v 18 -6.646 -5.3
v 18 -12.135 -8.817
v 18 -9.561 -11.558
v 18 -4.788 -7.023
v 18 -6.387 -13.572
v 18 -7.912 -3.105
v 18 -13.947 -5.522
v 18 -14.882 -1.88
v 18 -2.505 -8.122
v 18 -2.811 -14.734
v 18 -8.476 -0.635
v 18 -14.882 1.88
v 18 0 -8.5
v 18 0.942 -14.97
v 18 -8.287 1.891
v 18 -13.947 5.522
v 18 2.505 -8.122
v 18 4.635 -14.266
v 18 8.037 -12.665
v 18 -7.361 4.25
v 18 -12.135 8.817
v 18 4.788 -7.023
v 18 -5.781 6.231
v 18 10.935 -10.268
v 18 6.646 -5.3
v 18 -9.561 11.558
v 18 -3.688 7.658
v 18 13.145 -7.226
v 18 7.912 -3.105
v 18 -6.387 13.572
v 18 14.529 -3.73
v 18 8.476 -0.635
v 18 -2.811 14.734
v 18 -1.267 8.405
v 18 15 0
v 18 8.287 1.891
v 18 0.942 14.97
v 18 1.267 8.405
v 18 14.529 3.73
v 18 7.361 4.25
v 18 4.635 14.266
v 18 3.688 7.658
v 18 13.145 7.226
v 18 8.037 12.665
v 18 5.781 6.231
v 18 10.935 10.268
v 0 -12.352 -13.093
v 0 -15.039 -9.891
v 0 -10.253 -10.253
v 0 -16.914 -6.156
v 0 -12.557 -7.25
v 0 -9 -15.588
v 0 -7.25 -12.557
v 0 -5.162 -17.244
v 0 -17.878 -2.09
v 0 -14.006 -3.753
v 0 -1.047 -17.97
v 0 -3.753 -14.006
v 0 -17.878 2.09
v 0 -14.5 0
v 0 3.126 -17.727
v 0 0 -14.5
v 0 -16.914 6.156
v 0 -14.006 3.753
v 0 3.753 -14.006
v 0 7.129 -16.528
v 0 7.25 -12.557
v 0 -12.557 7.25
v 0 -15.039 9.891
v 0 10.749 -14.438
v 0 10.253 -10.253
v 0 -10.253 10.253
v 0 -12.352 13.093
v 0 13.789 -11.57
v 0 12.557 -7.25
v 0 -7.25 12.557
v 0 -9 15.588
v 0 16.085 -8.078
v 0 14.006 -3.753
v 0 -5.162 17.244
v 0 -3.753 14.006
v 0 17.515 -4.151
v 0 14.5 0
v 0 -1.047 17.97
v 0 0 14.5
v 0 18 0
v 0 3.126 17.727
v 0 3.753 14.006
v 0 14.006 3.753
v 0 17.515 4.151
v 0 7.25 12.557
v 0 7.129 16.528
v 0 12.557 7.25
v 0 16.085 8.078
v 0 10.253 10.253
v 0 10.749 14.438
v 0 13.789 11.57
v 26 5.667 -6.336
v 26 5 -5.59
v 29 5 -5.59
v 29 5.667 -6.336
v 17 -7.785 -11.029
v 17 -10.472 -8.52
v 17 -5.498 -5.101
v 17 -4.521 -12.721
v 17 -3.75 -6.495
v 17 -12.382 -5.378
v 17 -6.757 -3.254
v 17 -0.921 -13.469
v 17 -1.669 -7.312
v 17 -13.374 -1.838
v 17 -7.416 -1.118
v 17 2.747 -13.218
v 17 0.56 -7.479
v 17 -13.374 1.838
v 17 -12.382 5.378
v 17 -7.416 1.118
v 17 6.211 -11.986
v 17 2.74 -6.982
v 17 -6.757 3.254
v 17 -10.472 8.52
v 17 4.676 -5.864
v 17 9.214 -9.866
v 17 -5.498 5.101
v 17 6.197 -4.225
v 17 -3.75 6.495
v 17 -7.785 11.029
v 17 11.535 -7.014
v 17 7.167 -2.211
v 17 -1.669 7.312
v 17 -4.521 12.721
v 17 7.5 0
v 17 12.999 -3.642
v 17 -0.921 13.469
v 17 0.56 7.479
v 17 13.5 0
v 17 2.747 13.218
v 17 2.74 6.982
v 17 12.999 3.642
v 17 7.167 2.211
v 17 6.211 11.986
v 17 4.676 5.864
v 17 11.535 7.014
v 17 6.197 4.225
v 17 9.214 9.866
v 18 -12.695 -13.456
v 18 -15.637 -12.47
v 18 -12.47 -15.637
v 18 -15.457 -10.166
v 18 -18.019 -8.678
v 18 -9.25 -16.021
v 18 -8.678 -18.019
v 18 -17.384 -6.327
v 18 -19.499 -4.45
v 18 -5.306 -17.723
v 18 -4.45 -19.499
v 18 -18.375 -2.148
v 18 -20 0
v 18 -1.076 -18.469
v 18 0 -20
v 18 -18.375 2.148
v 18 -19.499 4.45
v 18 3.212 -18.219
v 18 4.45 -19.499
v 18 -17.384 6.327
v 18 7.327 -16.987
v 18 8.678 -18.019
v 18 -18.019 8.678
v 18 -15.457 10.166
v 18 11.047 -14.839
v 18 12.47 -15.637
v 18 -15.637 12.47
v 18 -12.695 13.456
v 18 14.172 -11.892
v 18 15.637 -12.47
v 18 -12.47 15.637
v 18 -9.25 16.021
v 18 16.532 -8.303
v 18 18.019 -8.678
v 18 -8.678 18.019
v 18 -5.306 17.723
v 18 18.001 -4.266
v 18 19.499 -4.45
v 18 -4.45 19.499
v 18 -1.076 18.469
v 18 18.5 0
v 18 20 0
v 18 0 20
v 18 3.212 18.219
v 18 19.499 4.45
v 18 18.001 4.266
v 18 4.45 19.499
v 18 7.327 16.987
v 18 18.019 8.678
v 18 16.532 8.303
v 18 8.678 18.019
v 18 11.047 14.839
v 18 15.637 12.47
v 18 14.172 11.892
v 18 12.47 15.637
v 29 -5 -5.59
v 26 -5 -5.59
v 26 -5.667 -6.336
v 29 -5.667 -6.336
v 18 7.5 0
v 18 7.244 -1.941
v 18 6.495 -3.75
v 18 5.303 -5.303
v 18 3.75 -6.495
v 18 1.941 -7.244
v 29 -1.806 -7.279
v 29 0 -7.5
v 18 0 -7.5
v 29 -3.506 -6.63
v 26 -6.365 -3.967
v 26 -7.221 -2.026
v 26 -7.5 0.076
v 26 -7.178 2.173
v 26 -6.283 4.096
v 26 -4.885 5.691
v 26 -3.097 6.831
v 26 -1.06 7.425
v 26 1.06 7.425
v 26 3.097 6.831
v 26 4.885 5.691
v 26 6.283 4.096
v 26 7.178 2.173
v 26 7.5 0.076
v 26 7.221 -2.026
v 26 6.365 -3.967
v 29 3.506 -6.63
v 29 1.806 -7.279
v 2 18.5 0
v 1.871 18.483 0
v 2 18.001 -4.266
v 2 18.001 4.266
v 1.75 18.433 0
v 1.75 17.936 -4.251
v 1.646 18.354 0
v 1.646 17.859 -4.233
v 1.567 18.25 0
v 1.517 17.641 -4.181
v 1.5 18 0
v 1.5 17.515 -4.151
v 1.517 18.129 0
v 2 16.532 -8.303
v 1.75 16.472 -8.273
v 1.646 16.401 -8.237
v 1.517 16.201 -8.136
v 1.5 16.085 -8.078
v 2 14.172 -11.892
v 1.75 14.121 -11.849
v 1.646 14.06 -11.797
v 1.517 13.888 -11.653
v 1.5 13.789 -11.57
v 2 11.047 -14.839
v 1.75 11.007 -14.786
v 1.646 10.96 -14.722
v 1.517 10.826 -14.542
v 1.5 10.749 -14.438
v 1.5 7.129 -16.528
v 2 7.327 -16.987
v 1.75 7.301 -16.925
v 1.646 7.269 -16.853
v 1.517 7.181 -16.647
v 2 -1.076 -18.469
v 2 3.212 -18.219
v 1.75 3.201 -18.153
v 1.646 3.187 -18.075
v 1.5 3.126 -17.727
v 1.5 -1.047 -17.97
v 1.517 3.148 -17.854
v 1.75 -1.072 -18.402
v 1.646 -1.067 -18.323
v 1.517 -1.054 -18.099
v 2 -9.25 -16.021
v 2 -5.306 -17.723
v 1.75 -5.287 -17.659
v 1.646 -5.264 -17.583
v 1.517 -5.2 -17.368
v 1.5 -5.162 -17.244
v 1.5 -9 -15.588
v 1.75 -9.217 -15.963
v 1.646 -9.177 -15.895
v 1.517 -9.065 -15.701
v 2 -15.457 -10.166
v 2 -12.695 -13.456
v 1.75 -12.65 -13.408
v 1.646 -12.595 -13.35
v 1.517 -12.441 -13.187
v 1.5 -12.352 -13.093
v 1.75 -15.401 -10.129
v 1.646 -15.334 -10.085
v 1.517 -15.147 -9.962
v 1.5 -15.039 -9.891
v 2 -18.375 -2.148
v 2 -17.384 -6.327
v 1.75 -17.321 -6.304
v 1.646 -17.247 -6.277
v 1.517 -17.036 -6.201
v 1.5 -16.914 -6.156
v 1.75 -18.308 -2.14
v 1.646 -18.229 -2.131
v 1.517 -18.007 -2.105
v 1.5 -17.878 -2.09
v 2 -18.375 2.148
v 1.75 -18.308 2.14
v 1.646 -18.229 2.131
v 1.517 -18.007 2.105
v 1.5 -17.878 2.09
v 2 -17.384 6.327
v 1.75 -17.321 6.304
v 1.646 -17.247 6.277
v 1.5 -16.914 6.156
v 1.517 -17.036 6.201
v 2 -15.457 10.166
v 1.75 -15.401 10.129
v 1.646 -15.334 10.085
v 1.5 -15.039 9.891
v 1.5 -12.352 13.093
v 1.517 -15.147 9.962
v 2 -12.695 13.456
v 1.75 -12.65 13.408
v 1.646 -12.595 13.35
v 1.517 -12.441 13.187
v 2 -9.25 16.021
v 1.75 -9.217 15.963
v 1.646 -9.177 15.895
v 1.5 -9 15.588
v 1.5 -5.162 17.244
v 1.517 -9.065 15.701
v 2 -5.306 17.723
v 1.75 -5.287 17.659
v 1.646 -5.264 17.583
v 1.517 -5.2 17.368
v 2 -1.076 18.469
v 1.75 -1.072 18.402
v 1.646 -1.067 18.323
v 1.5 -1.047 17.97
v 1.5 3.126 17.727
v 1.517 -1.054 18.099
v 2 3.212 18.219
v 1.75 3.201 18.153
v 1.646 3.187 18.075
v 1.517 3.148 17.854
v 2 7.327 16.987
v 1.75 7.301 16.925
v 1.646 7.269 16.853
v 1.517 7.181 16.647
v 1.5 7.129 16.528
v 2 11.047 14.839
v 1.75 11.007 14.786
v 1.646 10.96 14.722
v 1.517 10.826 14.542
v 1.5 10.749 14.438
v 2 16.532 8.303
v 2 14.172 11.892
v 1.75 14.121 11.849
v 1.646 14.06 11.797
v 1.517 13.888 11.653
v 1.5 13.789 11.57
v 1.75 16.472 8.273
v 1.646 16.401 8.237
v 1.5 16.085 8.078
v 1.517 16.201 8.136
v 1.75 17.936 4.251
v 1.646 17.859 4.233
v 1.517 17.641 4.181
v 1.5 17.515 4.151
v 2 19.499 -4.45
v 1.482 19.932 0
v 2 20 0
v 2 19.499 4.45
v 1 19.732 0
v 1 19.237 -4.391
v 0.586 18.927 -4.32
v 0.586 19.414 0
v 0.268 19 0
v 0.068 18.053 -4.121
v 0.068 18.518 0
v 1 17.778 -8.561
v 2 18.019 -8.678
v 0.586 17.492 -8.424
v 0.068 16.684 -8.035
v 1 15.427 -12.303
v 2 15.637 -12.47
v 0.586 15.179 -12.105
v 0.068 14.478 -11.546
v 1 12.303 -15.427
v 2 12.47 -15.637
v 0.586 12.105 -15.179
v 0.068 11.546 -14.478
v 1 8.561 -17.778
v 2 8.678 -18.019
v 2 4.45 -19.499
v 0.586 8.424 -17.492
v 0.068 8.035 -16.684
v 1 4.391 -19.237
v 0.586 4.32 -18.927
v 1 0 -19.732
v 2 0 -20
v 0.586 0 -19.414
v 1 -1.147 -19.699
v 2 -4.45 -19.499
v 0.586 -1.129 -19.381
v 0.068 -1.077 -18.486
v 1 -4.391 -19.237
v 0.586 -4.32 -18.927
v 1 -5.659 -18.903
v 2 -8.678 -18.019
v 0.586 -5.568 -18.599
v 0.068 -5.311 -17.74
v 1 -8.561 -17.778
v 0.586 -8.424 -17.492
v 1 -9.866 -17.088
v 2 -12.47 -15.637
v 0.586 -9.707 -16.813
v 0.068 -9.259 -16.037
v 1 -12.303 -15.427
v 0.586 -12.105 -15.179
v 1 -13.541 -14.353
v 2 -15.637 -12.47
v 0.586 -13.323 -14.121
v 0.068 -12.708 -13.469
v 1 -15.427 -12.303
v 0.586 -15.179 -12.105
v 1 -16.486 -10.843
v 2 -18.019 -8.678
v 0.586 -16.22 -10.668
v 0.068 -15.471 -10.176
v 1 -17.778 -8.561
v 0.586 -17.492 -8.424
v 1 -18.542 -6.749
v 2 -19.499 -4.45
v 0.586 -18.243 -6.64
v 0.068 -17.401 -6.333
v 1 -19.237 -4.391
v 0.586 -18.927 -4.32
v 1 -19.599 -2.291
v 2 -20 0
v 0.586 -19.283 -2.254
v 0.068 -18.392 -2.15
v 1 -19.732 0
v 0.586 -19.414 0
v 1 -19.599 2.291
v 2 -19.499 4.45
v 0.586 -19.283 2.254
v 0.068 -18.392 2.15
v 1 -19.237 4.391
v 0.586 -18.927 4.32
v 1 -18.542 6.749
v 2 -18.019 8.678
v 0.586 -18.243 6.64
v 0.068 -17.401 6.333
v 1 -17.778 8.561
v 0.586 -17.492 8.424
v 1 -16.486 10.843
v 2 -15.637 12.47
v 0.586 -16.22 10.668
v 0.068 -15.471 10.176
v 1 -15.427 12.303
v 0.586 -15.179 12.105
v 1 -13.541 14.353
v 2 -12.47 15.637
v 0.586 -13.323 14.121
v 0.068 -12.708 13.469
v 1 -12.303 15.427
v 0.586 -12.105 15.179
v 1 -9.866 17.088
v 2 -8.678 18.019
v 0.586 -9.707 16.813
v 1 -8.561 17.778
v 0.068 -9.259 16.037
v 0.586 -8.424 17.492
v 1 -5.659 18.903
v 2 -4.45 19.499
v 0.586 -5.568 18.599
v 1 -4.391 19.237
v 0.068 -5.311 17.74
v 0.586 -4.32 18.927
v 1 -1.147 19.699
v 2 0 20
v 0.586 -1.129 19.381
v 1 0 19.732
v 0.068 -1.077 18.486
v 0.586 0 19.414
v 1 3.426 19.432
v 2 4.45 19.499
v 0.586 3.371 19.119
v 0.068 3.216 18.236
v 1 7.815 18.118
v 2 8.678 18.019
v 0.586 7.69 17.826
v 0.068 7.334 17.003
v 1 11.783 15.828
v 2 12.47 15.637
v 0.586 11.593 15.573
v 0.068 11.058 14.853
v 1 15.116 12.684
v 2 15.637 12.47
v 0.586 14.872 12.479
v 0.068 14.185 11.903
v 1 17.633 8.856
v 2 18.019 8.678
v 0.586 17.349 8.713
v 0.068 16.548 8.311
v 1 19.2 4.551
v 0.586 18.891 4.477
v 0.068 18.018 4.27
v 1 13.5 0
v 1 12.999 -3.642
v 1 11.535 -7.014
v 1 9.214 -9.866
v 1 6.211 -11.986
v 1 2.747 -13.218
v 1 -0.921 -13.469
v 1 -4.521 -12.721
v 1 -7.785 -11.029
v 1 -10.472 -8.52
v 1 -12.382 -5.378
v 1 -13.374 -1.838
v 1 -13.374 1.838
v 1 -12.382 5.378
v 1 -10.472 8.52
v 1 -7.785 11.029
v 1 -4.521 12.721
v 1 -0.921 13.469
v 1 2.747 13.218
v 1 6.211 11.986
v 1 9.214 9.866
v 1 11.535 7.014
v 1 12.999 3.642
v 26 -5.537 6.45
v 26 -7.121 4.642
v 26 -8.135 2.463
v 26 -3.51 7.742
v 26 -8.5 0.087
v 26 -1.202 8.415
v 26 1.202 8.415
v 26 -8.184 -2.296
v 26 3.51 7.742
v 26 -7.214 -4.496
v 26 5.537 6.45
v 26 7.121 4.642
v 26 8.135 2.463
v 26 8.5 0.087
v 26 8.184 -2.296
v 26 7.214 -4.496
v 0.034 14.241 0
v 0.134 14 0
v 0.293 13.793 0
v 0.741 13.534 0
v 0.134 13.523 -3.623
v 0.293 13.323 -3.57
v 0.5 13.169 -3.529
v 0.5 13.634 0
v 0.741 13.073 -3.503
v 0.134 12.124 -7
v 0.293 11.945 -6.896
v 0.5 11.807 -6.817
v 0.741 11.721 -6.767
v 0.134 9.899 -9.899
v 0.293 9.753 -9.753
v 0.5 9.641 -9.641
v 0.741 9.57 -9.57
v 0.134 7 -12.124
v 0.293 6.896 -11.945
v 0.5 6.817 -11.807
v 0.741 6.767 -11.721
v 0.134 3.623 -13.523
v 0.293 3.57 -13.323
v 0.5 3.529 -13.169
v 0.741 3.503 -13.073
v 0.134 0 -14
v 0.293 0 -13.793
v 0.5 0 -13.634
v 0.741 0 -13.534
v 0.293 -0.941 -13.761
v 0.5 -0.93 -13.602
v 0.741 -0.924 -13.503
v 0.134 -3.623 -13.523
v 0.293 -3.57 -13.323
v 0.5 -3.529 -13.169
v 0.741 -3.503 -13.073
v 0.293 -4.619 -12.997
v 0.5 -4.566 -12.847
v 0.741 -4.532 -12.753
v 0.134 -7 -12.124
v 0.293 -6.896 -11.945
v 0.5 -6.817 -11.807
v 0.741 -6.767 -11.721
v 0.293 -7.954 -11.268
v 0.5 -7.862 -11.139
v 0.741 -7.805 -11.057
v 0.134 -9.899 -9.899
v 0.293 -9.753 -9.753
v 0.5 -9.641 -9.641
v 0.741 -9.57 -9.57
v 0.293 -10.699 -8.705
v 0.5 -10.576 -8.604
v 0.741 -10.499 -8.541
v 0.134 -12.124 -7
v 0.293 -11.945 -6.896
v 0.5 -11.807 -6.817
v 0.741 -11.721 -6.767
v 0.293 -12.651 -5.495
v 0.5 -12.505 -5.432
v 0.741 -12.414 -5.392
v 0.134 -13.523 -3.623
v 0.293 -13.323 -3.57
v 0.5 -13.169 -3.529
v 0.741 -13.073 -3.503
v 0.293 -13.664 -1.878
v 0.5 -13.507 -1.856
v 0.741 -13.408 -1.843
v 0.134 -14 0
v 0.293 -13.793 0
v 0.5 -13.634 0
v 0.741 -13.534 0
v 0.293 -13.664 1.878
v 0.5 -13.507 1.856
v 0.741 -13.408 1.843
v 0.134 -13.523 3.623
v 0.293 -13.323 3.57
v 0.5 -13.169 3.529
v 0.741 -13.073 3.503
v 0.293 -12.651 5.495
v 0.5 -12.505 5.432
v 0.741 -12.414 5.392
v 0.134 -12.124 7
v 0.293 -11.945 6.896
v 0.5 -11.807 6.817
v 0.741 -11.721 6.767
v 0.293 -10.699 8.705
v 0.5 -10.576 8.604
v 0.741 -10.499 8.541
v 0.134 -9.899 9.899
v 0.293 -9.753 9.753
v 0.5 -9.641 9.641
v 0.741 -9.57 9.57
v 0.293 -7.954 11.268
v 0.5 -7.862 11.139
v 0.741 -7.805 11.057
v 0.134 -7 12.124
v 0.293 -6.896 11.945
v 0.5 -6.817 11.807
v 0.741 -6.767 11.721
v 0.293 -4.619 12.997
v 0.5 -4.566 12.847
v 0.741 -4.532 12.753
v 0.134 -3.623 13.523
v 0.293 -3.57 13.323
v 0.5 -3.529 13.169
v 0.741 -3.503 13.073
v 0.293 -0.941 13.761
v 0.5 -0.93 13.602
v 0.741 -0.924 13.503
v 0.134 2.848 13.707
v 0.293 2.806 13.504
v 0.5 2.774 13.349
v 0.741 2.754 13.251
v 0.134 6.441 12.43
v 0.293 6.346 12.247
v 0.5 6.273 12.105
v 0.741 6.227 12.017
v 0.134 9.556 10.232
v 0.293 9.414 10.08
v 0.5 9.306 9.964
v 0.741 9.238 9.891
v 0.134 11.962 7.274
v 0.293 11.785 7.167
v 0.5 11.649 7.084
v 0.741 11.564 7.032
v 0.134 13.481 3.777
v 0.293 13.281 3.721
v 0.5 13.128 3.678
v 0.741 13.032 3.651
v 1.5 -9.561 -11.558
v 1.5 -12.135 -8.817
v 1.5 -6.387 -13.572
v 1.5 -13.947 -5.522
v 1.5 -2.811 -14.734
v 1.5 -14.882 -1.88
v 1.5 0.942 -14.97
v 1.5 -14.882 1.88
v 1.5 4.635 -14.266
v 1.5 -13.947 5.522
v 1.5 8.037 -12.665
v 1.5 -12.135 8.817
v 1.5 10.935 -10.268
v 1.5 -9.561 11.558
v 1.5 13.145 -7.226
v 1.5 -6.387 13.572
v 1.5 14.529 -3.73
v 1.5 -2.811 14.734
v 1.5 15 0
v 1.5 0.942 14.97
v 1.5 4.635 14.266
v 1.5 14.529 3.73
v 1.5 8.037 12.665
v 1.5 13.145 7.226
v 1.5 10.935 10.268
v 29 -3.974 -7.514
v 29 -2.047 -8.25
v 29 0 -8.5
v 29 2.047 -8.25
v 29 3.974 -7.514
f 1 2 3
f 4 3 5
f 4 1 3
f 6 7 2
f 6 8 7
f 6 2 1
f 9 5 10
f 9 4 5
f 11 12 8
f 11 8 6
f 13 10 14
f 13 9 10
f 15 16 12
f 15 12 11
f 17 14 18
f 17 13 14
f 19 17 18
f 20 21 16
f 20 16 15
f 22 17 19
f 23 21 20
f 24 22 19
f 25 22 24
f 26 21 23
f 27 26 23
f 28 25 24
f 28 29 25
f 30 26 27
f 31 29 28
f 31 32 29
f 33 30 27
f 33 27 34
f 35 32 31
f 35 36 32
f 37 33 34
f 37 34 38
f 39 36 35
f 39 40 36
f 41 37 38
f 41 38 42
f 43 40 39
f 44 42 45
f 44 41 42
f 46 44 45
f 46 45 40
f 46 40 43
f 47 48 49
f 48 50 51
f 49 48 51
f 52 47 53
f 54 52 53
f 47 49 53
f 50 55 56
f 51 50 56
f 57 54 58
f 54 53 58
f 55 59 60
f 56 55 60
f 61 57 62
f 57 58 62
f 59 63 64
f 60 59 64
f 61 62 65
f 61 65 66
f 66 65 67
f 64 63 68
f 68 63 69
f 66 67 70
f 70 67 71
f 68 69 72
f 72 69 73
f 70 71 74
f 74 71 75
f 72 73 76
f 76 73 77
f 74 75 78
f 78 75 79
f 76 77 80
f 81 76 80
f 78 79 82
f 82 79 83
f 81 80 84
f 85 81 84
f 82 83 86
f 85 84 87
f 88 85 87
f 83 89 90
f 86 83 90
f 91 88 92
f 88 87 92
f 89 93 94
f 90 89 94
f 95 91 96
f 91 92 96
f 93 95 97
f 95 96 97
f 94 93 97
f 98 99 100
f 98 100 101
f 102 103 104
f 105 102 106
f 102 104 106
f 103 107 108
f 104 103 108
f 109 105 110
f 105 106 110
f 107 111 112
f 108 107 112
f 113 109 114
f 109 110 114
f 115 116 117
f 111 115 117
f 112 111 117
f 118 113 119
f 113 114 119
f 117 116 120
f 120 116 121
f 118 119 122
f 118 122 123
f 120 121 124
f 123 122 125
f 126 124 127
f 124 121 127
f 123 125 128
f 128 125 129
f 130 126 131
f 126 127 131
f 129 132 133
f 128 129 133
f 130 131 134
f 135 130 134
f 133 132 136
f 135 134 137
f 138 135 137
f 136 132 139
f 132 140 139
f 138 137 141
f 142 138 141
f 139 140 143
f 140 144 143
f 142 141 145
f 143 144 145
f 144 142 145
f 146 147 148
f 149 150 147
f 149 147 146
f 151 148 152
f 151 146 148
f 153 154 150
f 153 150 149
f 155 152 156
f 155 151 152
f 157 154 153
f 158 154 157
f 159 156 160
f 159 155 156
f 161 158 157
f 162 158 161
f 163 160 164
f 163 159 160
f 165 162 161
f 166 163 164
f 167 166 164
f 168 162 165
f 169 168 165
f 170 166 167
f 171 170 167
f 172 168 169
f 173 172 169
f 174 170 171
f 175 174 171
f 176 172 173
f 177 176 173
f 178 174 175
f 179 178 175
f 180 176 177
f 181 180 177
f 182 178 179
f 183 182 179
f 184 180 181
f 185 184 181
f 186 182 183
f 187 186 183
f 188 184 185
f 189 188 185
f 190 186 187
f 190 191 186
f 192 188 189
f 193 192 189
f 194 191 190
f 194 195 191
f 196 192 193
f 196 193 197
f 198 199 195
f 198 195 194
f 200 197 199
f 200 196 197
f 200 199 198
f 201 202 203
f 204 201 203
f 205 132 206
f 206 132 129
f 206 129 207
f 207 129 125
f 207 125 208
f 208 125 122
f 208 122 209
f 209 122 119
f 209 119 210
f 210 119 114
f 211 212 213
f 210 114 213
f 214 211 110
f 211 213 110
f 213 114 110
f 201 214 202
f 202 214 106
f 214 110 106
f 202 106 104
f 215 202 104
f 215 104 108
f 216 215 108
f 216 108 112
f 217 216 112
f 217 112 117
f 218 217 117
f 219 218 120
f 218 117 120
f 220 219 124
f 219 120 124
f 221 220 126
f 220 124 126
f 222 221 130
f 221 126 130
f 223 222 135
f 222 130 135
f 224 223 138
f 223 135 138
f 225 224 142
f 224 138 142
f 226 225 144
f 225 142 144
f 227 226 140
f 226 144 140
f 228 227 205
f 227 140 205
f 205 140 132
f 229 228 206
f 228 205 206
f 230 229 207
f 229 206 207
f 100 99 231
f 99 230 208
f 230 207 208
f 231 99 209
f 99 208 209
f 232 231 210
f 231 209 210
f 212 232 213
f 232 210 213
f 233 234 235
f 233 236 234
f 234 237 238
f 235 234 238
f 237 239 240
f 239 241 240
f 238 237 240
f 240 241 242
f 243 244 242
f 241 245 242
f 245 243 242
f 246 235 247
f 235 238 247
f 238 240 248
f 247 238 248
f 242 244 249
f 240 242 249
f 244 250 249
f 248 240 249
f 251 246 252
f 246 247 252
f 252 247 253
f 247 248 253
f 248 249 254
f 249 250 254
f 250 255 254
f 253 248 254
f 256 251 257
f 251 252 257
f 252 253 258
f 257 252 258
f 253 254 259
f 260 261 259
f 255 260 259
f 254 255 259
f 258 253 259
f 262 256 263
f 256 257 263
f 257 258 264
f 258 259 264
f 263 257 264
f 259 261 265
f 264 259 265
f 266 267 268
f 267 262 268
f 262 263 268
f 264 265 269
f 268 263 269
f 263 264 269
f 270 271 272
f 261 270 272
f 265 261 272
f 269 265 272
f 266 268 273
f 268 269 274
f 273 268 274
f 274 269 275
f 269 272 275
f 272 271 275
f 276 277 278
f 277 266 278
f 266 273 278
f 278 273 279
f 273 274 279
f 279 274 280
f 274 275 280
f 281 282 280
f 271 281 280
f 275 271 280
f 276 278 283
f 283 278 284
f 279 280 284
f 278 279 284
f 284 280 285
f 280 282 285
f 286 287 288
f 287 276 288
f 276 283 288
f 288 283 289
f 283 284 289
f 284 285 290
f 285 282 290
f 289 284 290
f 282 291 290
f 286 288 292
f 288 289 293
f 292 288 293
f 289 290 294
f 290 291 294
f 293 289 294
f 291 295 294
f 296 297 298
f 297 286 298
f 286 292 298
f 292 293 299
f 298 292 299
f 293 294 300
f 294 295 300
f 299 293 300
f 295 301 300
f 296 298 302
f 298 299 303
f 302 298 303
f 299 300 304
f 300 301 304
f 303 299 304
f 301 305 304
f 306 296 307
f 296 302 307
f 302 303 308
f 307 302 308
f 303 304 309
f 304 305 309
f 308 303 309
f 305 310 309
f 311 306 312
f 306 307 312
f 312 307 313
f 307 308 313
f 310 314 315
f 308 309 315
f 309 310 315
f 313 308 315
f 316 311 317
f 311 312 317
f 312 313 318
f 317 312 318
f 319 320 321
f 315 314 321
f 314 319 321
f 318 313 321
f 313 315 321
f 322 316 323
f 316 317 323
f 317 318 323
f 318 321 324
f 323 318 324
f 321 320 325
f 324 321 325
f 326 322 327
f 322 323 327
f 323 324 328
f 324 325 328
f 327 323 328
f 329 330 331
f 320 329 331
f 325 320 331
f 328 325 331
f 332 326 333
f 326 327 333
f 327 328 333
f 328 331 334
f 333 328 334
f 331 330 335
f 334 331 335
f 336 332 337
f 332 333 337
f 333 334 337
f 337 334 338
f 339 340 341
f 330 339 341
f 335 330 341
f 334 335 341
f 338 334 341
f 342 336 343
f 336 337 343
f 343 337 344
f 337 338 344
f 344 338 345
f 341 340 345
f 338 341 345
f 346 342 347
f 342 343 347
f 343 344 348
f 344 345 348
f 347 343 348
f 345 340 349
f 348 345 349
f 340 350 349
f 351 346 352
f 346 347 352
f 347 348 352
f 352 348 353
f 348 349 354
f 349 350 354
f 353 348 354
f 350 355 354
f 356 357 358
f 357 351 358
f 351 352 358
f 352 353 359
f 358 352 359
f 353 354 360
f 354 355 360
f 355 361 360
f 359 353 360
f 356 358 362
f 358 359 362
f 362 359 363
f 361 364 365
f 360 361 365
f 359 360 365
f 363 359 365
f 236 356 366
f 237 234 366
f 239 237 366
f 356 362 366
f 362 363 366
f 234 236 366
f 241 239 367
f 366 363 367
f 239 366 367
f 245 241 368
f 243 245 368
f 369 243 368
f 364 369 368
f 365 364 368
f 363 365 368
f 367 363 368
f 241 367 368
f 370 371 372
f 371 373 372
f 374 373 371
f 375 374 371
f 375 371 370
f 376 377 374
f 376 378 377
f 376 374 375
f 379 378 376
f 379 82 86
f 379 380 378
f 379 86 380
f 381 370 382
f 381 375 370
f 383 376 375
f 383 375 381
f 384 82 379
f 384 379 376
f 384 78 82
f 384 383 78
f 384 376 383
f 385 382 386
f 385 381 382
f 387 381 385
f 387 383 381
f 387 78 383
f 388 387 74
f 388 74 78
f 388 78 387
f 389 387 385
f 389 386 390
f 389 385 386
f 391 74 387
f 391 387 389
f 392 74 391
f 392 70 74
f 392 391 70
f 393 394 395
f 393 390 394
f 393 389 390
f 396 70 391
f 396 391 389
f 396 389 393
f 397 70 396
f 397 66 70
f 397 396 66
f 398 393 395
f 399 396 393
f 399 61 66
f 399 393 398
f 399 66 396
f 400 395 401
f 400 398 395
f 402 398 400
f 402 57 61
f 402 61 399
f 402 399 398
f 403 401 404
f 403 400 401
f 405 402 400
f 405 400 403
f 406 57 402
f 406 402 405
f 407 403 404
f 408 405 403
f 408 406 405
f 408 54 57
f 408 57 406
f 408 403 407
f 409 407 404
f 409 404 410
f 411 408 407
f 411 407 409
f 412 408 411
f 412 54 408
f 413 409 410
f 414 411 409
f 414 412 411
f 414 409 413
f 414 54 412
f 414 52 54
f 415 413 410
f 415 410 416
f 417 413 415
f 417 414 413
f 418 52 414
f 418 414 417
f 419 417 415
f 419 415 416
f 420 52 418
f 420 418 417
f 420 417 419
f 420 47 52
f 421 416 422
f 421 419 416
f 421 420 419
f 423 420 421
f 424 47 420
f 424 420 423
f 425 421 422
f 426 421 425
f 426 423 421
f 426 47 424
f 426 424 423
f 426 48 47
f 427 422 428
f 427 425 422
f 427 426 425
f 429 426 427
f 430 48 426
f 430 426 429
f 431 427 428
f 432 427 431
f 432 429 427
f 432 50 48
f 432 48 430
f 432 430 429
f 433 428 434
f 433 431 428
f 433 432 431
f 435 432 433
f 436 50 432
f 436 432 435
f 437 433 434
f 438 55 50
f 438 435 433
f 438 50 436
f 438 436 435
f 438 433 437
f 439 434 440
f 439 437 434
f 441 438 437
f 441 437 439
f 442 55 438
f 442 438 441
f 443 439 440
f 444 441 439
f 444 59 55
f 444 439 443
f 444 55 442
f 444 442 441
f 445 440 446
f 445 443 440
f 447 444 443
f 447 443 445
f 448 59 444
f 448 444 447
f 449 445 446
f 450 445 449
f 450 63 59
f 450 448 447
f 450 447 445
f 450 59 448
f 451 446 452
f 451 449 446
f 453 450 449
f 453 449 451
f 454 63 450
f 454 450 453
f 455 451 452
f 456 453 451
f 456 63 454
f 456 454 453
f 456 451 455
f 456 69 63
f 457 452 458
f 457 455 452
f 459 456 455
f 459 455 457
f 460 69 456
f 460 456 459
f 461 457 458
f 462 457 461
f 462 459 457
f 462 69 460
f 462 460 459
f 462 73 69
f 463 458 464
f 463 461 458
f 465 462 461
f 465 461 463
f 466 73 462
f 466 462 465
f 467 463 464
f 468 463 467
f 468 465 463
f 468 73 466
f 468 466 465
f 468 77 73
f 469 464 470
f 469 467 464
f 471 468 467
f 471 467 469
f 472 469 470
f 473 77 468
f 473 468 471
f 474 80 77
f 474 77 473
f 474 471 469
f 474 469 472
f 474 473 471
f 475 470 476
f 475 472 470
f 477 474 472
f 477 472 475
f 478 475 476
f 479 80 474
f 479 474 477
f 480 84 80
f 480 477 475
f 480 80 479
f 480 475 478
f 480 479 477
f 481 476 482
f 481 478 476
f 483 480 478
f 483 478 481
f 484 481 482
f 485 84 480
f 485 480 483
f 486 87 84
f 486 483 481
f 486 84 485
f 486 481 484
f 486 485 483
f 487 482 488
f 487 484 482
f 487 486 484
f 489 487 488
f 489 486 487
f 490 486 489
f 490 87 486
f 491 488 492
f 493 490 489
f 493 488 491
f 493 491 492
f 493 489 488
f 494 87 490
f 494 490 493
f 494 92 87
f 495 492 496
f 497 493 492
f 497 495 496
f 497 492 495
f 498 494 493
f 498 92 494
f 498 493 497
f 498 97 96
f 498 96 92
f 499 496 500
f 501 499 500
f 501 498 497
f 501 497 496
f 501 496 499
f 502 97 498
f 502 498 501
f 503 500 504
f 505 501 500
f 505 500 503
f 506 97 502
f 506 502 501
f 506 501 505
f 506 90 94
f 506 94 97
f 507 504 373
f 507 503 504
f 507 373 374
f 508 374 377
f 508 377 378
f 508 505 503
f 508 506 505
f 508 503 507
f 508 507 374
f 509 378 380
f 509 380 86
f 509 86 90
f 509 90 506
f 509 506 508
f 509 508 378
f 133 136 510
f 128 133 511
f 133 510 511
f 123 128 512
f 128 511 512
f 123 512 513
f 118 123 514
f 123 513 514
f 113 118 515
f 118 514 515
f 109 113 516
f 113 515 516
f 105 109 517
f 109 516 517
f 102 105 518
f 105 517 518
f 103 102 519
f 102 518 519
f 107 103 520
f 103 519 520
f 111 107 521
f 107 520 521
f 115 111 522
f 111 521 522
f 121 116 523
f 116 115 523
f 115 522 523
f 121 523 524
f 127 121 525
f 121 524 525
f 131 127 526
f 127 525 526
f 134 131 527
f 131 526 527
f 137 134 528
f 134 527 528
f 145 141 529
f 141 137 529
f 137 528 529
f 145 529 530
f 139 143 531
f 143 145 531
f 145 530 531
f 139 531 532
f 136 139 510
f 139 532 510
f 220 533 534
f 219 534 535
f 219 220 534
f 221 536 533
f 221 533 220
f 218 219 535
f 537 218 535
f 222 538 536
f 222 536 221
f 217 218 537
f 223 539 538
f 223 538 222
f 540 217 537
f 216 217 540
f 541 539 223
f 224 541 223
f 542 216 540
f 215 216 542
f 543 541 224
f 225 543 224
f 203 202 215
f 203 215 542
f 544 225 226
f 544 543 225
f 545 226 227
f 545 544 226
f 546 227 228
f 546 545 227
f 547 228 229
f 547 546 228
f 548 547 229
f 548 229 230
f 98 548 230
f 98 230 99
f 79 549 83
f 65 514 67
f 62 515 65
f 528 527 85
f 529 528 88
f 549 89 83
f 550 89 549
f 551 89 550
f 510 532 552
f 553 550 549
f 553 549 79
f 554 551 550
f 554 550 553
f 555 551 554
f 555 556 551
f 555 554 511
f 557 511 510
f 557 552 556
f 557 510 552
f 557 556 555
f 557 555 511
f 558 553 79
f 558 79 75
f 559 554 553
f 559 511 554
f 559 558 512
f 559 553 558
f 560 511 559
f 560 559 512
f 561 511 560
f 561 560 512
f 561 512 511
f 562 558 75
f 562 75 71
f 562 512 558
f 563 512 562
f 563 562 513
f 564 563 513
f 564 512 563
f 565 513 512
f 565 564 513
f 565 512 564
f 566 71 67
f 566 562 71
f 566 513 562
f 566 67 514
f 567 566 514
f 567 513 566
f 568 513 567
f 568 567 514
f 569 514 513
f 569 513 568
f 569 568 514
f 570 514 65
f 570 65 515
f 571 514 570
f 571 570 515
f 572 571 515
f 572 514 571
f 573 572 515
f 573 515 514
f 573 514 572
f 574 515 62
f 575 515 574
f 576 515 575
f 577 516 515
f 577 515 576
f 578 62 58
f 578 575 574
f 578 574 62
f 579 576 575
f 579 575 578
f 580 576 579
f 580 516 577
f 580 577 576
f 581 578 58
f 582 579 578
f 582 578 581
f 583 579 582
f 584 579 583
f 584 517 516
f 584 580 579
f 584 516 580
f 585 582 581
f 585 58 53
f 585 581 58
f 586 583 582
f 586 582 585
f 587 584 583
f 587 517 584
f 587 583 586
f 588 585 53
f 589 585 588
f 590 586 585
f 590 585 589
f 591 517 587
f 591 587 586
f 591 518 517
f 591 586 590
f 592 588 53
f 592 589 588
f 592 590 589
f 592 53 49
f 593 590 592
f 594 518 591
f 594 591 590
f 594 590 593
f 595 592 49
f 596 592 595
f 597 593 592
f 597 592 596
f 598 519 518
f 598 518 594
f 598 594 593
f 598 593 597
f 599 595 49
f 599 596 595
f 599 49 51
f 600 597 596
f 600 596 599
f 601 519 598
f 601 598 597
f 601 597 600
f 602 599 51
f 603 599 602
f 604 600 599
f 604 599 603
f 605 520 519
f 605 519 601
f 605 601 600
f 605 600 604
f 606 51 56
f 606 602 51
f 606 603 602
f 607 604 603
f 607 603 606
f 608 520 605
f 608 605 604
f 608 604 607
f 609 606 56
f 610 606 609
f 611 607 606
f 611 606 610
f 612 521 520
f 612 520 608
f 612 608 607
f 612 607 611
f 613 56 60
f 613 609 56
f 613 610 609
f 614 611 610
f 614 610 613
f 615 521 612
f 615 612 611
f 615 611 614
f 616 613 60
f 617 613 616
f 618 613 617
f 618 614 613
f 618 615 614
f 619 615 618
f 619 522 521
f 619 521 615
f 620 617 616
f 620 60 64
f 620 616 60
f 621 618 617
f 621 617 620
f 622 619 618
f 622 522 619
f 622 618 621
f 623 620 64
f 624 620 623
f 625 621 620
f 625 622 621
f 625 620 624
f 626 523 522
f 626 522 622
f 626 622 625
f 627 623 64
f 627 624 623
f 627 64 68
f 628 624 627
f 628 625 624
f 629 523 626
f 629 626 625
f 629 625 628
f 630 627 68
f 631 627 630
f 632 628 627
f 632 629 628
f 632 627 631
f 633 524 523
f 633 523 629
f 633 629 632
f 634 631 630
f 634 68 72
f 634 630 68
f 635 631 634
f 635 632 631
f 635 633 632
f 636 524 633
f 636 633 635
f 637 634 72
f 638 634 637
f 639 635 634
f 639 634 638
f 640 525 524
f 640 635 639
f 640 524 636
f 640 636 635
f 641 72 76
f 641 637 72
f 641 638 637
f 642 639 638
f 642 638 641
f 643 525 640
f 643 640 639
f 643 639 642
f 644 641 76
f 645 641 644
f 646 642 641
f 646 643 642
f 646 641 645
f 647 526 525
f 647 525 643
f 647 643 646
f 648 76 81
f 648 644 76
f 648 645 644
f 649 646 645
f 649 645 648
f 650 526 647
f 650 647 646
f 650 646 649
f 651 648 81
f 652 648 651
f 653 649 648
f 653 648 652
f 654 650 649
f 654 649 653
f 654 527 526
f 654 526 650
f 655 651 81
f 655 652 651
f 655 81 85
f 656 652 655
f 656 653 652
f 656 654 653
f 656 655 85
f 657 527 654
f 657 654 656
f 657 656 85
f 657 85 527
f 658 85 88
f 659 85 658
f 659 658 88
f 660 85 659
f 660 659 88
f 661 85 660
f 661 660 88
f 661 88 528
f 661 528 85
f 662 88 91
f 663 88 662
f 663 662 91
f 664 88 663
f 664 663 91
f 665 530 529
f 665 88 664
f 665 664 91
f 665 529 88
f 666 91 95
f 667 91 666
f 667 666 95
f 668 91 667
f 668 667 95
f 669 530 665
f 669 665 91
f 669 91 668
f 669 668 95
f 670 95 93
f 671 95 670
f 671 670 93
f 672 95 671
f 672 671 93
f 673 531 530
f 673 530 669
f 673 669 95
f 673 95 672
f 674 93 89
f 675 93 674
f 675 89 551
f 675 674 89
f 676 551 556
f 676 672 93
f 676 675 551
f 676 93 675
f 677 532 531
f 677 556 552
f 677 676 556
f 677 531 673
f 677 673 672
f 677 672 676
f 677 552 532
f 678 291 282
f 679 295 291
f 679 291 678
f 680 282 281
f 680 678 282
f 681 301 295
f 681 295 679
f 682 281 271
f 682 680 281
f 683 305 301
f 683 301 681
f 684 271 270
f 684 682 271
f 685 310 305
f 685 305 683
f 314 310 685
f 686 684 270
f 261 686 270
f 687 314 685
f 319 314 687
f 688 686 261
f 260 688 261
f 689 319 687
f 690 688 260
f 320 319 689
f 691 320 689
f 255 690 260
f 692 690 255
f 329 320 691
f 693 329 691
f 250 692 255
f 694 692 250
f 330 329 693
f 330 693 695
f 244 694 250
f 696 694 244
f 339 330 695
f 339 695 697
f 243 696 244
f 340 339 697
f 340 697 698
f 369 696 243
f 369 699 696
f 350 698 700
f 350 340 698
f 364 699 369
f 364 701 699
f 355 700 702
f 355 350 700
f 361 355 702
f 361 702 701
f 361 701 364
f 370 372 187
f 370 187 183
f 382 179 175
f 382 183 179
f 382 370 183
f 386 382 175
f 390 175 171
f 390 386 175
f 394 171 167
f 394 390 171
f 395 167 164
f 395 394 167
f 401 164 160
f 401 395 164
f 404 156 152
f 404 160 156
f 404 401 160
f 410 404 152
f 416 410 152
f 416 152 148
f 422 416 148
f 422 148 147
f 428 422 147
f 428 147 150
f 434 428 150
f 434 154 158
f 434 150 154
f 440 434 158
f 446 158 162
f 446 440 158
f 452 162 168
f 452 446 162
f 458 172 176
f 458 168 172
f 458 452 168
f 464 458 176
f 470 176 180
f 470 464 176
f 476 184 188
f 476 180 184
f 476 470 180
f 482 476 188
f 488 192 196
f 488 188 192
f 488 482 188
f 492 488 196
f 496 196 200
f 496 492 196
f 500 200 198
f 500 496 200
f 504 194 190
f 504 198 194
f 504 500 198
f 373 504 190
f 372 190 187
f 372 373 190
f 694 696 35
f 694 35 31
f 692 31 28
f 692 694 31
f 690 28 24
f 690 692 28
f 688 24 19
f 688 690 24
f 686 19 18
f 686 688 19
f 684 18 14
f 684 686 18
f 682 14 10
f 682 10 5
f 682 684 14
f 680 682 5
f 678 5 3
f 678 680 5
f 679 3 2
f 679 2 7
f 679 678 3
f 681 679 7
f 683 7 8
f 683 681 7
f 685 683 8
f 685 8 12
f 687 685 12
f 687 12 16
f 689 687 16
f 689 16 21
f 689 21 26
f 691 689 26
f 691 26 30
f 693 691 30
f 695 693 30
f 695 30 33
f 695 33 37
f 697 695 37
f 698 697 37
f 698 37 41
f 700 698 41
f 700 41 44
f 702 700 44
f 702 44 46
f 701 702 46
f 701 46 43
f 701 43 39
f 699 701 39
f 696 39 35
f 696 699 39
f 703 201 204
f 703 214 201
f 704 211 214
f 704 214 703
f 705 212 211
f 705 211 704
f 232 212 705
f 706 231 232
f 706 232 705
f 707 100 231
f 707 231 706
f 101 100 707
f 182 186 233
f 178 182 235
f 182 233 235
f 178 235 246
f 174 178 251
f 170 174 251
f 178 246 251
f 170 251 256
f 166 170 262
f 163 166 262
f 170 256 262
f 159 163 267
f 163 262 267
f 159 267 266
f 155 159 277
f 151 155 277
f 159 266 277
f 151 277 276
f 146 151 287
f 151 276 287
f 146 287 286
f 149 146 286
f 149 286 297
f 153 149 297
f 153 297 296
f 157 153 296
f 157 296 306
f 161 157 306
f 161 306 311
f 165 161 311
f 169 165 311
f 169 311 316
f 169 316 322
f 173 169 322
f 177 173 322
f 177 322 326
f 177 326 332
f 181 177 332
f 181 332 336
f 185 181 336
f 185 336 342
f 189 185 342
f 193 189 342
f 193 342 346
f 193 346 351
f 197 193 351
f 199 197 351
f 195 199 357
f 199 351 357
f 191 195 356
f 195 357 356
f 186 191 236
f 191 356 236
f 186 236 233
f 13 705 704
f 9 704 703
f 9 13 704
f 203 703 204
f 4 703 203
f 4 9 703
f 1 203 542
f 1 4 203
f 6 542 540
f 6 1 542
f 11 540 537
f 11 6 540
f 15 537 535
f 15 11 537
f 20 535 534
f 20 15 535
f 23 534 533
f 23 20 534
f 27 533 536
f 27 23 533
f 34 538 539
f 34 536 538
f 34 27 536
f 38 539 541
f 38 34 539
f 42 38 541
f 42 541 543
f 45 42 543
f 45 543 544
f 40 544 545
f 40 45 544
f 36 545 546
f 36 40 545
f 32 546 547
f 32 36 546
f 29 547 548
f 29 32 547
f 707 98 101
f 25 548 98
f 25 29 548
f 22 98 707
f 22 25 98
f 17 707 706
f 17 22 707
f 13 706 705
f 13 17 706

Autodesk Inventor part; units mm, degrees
ref_plane "XZ Plane" through (0, 0, 0) normal (0, 1, 0) x (-1, 0, 0)
ref_plane "XY Plane" through (0, 0, 0) normal (0, 0, 1) x (1, 0, 0)
ref_plane "Work Plane1" through (20, 0, 0) normal (1, 0, 0) x (0, 1, 0)
sketch "Sketch7" plane through (0, 0, 0) normal (1, 0, 0) x (0, 1, 0)
  circle A0 centre (0, 0) radius 7.5
  circle A1 centre (0, 0) radius 20
  dimension "d28" = 15
  dimension "d29" = 40
extrude "Wheel" add sketch "Sketch7" along normal blind 18
sketch "Sketch8" plane through (0, 0, 0) normal (1, 0, 0) x (0, 1, 0)
  circle A0 centre (0, 0) radius 13.5
  dimension "d33" = 27
extrude "Extrusion7" cut sketch "Sketch8" along normal blind 17
fillet "Fillet1" radius 2 1 edges at (0, -20, 0)
fillet "Fillet2" radius 1 1 edges at (0, -13.5, 0)
shell "Shell1" thickness 1.5 removed faces 1 at (18, 15.6396, -1.5954)
sketch "Sketch10" plane through (18, 0, 0) normal (1, 0, 0) x (0, 0, -1)
  circle A0 centre (0, 0) radius 8.5
  circle A1 centre (0, 0) radius 7.5 projected
  dimension "d41" = 17
extrude "Extrusion9" add sketch "Sketch10" along normal blind 8
sketch "Sketch12" plane through (26, 0, 0) normal (1, 0, 0) x (0, 0, -1)
  circle A0 centre (0, 0) radius 8.5 projected
  circle A1 centre (0, 0) radius 7.5 projected
  line L0 (0, 0) -> (5.5902, -5)
  line L1 (0, 0) -> (5.5902, 5)
  circle A2 centre (0, 0) radius 7.5 projected
  line L2 (5.5902, 5) -> (5.5902, -5) construction
  line L3 (0, 0) -> (0, 5.0755) construction
  line L4 (5.5902, -5) -> (6.3355, -5.6667)
  line L5 (5.5902, 5) -> (6.3355, 5.6667)
  arc A3 (5.5902, -5) -> (5.5902, 5) centre (0, 0) ccw
  arc A4 (6.3355, -5.6667) -> (6.3355, 5.6667) centre (0, 0) ccw
  dimension "d53" = 10
extrude "Extrusion11" add sketch "Sketch12" along normal blind 3 contours A0 L4 A1 L5 picked at (8.0097, 1.2845)
properties part number "RearWheelRight"
